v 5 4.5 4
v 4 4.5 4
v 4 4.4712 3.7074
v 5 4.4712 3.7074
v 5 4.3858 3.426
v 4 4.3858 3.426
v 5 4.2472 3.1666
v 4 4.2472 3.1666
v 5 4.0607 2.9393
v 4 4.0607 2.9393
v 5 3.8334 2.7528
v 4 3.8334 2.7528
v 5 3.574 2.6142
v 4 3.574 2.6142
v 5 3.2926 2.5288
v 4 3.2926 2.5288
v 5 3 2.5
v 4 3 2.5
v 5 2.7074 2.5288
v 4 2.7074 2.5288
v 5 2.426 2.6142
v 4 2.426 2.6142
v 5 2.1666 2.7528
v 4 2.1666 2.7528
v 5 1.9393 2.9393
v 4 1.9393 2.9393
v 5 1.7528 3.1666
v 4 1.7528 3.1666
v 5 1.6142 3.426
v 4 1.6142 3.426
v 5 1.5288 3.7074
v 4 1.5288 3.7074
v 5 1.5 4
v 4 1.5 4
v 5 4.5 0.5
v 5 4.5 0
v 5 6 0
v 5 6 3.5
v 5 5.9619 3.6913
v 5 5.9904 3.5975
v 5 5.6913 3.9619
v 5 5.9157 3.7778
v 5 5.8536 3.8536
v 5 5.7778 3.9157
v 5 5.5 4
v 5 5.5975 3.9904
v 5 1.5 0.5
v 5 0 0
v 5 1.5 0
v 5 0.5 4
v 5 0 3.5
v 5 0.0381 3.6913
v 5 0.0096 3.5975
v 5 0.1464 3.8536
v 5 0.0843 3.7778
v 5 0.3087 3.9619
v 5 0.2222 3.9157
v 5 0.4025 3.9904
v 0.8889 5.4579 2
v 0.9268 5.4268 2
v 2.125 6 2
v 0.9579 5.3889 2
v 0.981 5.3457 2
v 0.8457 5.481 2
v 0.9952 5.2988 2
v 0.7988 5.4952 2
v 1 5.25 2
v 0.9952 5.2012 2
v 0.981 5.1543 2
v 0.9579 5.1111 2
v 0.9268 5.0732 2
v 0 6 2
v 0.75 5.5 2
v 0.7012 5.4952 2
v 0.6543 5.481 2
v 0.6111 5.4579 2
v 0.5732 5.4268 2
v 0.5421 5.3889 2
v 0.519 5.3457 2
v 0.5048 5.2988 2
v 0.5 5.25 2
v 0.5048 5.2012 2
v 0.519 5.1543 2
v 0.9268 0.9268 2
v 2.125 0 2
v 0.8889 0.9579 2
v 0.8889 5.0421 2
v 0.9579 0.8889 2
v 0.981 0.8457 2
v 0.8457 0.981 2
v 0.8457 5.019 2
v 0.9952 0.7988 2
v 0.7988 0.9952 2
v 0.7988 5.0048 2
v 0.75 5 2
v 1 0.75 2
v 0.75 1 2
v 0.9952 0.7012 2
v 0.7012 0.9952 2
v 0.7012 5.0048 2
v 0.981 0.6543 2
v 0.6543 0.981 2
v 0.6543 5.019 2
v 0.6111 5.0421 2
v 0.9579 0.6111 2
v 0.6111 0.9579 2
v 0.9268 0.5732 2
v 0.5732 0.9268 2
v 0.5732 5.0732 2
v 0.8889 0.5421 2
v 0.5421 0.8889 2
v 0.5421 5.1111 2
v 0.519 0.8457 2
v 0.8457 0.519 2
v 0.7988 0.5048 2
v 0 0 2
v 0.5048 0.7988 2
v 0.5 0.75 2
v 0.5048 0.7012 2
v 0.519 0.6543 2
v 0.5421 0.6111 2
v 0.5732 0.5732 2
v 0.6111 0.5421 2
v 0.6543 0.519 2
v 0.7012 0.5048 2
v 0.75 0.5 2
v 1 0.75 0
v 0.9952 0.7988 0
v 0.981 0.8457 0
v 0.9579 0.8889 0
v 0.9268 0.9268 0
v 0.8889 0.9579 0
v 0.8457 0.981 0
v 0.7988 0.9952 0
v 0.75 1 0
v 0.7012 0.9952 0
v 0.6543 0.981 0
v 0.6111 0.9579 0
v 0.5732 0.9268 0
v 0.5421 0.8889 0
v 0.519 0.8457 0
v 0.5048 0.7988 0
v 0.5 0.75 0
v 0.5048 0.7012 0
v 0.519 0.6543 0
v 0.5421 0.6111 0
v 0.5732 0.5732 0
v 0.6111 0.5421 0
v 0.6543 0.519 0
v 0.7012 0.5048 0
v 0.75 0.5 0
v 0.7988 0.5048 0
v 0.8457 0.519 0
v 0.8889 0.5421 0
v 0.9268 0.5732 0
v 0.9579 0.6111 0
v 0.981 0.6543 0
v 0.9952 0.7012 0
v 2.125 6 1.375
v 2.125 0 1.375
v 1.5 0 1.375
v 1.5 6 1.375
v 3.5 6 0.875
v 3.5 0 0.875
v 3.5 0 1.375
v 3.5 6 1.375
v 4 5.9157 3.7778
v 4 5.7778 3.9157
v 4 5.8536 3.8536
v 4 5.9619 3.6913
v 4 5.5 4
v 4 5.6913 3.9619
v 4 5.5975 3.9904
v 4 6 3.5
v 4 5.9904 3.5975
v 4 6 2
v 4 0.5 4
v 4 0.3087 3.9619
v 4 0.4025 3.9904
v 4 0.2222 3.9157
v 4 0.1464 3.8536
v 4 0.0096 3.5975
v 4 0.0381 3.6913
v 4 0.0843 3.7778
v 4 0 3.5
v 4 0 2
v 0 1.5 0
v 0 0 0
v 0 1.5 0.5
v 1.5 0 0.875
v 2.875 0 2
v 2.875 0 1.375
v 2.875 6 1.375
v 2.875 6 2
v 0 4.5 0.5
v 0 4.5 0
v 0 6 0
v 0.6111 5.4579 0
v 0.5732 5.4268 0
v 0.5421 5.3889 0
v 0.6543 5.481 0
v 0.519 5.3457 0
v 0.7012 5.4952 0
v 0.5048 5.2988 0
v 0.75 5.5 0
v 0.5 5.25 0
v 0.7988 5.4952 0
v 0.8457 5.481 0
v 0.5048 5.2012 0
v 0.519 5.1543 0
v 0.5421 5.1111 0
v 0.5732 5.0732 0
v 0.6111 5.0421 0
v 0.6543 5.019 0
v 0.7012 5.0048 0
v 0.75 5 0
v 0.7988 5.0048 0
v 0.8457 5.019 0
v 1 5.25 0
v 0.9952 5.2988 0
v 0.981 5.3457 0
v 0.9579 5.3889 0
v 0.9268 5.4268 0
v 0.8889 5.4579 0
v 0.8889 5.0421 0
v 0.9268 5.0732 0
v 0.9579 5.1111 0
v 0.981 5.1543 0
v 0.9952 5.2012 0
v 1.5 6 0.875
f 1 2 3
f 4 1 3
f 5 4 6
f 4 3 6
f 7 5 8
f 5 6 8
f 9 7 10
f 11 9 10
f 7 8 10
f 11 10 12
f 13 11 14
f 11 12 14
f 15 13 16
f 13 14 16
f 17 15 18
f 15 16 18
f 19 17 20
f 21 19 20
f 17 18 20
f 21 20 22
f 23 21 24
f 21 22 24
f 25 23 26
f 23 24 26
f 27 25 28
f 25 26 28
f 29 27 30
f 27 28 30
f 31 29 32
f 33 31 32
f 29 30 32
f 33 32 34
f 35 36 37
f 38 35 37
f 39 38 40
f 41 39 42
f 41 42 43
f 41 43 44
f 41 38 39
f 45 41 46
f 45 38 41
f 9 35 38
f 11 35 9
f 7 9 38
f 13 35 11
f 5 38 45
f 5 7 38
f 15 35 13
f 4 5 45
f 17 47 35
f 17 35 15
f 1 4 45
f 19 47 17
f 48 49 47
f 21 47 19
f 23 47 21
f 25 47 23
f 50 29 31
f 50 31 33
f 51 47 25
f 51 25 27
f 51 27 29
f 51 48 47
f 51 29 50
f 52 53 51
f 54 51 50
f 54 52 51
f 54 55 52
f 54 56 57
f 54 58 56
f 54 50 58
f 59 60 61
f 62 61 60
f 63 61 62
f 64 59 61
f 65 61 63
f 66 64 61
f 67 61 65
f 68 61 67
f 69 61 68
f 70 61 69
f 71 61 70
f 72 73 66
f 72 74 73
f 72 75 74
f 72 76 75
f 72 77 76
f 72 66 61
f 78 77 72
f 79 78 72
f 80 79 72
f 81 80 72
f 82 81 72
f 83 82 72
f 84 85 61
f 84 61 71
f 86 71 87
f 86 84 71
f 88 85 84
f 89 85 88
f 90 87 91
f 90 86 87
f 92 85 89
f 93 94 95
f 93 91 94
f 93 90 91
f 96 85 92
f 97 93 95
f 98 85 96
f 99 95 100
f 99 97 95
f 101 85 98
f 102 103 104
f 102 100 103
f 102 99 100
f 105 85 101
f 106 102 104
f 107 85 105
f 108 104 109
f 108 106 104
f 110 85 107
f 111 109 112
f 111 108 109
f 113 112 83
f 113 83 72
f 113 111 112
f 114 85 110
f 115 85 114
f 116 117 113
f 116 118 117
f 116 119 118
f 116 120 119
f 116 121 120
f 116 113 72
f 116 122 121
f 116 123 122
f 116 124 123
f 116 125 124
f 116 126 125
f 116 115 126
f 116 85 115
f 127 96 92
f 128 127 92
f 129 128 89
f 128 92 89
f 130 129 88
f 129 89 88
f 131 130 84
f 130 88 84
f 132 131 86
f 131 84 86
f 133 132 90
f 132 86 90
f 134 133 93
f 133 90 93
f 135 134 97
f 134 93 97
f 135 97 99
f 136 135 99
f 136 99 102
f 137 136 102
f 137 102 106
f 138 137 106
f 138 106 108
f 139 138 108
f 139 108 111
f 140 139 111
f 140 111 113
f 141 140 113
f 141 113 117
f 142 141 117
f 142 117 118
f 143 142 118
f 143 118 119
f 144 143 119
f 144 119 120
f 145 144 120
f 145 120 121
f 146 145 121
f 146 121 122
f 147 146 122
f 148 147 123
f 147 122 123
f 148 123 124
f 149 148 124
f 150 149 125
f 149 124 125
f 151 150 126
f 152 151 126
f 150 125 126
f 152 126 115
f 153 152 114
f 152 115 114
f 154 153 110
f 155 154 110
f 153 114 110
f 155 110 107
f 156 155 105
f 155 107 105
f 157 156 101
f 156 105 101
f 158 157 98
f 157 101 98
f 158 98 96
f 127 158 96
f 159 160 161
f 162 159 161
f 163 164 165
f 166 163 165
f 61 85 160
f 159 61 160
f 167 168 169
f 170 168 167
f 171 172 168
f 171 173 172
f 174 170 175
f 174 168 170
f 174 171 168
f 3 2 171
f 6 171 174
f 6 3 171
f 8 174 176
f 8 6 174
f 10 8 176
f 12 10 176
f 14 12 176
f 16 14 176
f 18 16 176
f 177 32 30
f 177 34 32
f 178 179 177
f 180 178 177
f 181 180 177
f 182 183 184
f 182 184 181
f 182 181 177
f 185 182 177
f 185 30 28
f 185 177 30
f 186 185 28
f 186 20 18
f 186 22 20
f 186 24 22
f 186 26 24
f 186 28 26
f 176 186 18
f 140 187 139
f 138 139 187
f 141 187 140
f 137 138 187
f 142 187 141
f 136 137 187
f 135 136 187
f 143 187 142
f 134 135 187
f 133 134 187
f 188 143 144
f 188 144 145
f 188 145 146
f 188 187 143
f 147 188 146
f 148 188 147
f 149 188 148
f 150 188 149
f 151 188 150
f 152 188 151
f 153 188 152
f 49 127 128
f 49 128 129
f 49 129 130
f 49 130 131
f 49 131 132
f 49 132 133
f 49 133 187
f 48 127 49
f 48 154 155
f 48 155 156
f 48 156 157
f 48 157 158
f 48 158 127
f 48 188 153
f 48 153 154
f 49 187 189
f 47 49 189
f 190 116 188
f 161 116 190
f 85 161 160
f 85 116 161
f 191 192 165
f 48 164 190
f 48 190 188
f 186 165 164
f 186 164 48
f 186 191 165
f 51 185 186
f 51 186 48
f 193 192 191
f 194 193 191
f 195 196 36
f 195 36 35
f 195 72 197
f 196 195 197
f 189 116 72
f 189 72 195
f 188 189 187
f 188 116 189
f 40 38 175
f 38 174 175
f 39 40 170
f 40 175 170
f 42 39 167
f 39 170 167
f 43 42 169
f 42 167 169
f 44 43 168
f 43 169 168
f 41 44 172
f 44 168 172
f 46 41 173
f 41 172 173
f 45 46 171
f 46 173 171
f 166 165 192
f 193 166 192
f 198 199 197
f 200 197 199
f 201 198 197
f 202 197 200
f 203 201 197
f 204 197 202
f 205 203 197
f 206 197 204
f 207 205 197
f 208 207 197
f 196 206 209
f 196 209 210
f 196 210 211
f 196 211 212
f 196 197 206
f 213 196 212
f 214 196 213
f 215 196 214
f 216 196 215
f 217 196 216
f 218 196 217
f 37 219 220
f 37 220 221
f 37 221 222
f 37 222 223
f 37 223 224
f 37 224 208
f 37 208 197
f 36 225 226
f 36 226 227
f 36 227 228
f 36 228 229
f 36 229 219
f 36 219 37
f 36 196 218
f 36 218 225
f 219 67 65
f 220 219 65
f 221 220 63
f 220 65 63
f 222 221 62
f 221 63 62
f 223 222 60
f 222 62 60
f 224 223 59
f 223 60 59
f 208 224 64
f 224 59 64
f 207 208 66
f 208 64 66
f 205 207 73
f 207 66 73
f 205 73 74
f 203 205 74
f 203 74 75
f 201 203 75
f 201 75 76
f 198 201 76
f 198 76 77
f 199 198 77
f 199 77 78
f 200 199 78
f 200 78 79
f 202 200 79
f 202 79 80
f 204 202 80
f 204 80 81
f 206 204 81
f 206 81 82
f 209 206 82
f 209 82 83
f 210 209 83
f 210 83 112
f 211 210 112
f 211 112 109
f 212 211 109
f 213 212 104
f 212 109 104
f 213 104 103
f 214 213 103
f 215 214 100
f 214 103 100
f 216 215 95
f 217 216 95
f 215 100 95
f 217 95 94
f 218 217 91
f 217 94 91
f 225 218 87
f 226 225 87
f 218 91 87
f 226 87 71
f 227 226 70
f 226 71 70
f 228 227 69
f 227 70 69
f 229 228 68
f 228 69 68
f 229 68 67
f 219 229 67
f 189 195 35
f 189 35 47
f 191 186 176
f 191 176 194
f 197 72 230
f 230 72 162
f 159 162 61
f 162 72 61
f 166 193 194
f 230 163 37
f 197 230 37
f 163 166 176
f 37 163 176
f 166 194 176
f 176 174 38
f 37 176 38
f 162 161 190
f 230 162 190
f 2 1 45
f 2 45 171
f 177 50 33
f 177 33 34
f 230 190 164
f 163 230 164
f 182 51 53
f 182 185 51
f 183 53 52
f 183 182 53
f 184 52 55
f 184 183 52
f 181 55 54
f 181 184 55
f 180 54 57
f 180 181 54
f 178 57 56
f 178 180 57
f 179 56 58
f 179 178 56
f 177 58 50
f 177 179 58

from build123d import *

# Parameters (mm, degrees)
F1_DEPTH = 6
F3_DEPTH = 25
F4_W     = 3
F4_H     = 0.5
F5_DEPTH = 25
F6_R     = 0.25
F7_DEPTH = 25
F9_DEPTH = 25
F10_R    = 0.5


with BuildPart() as f1:
    # F0 (on Front) → F1 (new body)
    with BuildSketch(Plane.XZ):
        Polygon((0, 2), (0, 0), (5, 0), (5, 4), (4, 4), (4, 2), align=None)
    extrude(amount=-F1_DEPTH)

    # F2 (on face) → F3 (cut)
    with BuildSketch(Plane.XZ):
        Polygon((2.875, 2), (2.125, 2), (2.125, 1.375), (1.5, 1.375), (1.5, 0.875), (3.5, 0.875), (3.5, 1.375), (2.875, 1.375), align=None)
    extrude(amount=-F3_DEPTH, mode=Mode.SUBTRACT)

    # F4 (on face) → F5 (cut)
    with BuildSketch(Plane(origin=(0, 0, 0), x_dir=(0, -1, 0), z_dir=(-1, 0, 0))):
        with Locations((-3, 0.25)):
            Rectangle(F4_W, F4_H)
    extrude(amount=-F5_DEPTH, mode=Mode.SUBTRACT)

    # F6 (on face) → F7 (cut)
    with BuildSketch(Plane.XY.offset(2)):
        with Locations((0.75, 0.75)):
            Circle(F6_R)
        with Locations((0.75, 5.25)):
            Circle(F6_R)
    extrude(amount=-F7_DEPTH, mode=Mode.SUBTRACT)

    # F8 (on face) → F9 (cut)
    with BuildSketch(Plane(origin=(4, 0, 0), x_dir=(0, -1, 0), z_dir=(-1, 0, 0))):
        with BuildLine():
            Line((-1.5, 4), (-4.5, 4))
            ThreePointArc((-4.5, 4), (-3, 2.5), (-1.5, 4))
        make_face()
    extrude(amount=-F9_DEPTH, mode=Mode.SUBTRACT)

    # F10
    f10_edges = [f1.edges().sort_by_distance(p)[0] for p in [
        (4.5, 0, 4),
        (4.5, 6, 4),
    ]]
    fillet(f10_edges, radius=F10_R)


solid = f1.part
